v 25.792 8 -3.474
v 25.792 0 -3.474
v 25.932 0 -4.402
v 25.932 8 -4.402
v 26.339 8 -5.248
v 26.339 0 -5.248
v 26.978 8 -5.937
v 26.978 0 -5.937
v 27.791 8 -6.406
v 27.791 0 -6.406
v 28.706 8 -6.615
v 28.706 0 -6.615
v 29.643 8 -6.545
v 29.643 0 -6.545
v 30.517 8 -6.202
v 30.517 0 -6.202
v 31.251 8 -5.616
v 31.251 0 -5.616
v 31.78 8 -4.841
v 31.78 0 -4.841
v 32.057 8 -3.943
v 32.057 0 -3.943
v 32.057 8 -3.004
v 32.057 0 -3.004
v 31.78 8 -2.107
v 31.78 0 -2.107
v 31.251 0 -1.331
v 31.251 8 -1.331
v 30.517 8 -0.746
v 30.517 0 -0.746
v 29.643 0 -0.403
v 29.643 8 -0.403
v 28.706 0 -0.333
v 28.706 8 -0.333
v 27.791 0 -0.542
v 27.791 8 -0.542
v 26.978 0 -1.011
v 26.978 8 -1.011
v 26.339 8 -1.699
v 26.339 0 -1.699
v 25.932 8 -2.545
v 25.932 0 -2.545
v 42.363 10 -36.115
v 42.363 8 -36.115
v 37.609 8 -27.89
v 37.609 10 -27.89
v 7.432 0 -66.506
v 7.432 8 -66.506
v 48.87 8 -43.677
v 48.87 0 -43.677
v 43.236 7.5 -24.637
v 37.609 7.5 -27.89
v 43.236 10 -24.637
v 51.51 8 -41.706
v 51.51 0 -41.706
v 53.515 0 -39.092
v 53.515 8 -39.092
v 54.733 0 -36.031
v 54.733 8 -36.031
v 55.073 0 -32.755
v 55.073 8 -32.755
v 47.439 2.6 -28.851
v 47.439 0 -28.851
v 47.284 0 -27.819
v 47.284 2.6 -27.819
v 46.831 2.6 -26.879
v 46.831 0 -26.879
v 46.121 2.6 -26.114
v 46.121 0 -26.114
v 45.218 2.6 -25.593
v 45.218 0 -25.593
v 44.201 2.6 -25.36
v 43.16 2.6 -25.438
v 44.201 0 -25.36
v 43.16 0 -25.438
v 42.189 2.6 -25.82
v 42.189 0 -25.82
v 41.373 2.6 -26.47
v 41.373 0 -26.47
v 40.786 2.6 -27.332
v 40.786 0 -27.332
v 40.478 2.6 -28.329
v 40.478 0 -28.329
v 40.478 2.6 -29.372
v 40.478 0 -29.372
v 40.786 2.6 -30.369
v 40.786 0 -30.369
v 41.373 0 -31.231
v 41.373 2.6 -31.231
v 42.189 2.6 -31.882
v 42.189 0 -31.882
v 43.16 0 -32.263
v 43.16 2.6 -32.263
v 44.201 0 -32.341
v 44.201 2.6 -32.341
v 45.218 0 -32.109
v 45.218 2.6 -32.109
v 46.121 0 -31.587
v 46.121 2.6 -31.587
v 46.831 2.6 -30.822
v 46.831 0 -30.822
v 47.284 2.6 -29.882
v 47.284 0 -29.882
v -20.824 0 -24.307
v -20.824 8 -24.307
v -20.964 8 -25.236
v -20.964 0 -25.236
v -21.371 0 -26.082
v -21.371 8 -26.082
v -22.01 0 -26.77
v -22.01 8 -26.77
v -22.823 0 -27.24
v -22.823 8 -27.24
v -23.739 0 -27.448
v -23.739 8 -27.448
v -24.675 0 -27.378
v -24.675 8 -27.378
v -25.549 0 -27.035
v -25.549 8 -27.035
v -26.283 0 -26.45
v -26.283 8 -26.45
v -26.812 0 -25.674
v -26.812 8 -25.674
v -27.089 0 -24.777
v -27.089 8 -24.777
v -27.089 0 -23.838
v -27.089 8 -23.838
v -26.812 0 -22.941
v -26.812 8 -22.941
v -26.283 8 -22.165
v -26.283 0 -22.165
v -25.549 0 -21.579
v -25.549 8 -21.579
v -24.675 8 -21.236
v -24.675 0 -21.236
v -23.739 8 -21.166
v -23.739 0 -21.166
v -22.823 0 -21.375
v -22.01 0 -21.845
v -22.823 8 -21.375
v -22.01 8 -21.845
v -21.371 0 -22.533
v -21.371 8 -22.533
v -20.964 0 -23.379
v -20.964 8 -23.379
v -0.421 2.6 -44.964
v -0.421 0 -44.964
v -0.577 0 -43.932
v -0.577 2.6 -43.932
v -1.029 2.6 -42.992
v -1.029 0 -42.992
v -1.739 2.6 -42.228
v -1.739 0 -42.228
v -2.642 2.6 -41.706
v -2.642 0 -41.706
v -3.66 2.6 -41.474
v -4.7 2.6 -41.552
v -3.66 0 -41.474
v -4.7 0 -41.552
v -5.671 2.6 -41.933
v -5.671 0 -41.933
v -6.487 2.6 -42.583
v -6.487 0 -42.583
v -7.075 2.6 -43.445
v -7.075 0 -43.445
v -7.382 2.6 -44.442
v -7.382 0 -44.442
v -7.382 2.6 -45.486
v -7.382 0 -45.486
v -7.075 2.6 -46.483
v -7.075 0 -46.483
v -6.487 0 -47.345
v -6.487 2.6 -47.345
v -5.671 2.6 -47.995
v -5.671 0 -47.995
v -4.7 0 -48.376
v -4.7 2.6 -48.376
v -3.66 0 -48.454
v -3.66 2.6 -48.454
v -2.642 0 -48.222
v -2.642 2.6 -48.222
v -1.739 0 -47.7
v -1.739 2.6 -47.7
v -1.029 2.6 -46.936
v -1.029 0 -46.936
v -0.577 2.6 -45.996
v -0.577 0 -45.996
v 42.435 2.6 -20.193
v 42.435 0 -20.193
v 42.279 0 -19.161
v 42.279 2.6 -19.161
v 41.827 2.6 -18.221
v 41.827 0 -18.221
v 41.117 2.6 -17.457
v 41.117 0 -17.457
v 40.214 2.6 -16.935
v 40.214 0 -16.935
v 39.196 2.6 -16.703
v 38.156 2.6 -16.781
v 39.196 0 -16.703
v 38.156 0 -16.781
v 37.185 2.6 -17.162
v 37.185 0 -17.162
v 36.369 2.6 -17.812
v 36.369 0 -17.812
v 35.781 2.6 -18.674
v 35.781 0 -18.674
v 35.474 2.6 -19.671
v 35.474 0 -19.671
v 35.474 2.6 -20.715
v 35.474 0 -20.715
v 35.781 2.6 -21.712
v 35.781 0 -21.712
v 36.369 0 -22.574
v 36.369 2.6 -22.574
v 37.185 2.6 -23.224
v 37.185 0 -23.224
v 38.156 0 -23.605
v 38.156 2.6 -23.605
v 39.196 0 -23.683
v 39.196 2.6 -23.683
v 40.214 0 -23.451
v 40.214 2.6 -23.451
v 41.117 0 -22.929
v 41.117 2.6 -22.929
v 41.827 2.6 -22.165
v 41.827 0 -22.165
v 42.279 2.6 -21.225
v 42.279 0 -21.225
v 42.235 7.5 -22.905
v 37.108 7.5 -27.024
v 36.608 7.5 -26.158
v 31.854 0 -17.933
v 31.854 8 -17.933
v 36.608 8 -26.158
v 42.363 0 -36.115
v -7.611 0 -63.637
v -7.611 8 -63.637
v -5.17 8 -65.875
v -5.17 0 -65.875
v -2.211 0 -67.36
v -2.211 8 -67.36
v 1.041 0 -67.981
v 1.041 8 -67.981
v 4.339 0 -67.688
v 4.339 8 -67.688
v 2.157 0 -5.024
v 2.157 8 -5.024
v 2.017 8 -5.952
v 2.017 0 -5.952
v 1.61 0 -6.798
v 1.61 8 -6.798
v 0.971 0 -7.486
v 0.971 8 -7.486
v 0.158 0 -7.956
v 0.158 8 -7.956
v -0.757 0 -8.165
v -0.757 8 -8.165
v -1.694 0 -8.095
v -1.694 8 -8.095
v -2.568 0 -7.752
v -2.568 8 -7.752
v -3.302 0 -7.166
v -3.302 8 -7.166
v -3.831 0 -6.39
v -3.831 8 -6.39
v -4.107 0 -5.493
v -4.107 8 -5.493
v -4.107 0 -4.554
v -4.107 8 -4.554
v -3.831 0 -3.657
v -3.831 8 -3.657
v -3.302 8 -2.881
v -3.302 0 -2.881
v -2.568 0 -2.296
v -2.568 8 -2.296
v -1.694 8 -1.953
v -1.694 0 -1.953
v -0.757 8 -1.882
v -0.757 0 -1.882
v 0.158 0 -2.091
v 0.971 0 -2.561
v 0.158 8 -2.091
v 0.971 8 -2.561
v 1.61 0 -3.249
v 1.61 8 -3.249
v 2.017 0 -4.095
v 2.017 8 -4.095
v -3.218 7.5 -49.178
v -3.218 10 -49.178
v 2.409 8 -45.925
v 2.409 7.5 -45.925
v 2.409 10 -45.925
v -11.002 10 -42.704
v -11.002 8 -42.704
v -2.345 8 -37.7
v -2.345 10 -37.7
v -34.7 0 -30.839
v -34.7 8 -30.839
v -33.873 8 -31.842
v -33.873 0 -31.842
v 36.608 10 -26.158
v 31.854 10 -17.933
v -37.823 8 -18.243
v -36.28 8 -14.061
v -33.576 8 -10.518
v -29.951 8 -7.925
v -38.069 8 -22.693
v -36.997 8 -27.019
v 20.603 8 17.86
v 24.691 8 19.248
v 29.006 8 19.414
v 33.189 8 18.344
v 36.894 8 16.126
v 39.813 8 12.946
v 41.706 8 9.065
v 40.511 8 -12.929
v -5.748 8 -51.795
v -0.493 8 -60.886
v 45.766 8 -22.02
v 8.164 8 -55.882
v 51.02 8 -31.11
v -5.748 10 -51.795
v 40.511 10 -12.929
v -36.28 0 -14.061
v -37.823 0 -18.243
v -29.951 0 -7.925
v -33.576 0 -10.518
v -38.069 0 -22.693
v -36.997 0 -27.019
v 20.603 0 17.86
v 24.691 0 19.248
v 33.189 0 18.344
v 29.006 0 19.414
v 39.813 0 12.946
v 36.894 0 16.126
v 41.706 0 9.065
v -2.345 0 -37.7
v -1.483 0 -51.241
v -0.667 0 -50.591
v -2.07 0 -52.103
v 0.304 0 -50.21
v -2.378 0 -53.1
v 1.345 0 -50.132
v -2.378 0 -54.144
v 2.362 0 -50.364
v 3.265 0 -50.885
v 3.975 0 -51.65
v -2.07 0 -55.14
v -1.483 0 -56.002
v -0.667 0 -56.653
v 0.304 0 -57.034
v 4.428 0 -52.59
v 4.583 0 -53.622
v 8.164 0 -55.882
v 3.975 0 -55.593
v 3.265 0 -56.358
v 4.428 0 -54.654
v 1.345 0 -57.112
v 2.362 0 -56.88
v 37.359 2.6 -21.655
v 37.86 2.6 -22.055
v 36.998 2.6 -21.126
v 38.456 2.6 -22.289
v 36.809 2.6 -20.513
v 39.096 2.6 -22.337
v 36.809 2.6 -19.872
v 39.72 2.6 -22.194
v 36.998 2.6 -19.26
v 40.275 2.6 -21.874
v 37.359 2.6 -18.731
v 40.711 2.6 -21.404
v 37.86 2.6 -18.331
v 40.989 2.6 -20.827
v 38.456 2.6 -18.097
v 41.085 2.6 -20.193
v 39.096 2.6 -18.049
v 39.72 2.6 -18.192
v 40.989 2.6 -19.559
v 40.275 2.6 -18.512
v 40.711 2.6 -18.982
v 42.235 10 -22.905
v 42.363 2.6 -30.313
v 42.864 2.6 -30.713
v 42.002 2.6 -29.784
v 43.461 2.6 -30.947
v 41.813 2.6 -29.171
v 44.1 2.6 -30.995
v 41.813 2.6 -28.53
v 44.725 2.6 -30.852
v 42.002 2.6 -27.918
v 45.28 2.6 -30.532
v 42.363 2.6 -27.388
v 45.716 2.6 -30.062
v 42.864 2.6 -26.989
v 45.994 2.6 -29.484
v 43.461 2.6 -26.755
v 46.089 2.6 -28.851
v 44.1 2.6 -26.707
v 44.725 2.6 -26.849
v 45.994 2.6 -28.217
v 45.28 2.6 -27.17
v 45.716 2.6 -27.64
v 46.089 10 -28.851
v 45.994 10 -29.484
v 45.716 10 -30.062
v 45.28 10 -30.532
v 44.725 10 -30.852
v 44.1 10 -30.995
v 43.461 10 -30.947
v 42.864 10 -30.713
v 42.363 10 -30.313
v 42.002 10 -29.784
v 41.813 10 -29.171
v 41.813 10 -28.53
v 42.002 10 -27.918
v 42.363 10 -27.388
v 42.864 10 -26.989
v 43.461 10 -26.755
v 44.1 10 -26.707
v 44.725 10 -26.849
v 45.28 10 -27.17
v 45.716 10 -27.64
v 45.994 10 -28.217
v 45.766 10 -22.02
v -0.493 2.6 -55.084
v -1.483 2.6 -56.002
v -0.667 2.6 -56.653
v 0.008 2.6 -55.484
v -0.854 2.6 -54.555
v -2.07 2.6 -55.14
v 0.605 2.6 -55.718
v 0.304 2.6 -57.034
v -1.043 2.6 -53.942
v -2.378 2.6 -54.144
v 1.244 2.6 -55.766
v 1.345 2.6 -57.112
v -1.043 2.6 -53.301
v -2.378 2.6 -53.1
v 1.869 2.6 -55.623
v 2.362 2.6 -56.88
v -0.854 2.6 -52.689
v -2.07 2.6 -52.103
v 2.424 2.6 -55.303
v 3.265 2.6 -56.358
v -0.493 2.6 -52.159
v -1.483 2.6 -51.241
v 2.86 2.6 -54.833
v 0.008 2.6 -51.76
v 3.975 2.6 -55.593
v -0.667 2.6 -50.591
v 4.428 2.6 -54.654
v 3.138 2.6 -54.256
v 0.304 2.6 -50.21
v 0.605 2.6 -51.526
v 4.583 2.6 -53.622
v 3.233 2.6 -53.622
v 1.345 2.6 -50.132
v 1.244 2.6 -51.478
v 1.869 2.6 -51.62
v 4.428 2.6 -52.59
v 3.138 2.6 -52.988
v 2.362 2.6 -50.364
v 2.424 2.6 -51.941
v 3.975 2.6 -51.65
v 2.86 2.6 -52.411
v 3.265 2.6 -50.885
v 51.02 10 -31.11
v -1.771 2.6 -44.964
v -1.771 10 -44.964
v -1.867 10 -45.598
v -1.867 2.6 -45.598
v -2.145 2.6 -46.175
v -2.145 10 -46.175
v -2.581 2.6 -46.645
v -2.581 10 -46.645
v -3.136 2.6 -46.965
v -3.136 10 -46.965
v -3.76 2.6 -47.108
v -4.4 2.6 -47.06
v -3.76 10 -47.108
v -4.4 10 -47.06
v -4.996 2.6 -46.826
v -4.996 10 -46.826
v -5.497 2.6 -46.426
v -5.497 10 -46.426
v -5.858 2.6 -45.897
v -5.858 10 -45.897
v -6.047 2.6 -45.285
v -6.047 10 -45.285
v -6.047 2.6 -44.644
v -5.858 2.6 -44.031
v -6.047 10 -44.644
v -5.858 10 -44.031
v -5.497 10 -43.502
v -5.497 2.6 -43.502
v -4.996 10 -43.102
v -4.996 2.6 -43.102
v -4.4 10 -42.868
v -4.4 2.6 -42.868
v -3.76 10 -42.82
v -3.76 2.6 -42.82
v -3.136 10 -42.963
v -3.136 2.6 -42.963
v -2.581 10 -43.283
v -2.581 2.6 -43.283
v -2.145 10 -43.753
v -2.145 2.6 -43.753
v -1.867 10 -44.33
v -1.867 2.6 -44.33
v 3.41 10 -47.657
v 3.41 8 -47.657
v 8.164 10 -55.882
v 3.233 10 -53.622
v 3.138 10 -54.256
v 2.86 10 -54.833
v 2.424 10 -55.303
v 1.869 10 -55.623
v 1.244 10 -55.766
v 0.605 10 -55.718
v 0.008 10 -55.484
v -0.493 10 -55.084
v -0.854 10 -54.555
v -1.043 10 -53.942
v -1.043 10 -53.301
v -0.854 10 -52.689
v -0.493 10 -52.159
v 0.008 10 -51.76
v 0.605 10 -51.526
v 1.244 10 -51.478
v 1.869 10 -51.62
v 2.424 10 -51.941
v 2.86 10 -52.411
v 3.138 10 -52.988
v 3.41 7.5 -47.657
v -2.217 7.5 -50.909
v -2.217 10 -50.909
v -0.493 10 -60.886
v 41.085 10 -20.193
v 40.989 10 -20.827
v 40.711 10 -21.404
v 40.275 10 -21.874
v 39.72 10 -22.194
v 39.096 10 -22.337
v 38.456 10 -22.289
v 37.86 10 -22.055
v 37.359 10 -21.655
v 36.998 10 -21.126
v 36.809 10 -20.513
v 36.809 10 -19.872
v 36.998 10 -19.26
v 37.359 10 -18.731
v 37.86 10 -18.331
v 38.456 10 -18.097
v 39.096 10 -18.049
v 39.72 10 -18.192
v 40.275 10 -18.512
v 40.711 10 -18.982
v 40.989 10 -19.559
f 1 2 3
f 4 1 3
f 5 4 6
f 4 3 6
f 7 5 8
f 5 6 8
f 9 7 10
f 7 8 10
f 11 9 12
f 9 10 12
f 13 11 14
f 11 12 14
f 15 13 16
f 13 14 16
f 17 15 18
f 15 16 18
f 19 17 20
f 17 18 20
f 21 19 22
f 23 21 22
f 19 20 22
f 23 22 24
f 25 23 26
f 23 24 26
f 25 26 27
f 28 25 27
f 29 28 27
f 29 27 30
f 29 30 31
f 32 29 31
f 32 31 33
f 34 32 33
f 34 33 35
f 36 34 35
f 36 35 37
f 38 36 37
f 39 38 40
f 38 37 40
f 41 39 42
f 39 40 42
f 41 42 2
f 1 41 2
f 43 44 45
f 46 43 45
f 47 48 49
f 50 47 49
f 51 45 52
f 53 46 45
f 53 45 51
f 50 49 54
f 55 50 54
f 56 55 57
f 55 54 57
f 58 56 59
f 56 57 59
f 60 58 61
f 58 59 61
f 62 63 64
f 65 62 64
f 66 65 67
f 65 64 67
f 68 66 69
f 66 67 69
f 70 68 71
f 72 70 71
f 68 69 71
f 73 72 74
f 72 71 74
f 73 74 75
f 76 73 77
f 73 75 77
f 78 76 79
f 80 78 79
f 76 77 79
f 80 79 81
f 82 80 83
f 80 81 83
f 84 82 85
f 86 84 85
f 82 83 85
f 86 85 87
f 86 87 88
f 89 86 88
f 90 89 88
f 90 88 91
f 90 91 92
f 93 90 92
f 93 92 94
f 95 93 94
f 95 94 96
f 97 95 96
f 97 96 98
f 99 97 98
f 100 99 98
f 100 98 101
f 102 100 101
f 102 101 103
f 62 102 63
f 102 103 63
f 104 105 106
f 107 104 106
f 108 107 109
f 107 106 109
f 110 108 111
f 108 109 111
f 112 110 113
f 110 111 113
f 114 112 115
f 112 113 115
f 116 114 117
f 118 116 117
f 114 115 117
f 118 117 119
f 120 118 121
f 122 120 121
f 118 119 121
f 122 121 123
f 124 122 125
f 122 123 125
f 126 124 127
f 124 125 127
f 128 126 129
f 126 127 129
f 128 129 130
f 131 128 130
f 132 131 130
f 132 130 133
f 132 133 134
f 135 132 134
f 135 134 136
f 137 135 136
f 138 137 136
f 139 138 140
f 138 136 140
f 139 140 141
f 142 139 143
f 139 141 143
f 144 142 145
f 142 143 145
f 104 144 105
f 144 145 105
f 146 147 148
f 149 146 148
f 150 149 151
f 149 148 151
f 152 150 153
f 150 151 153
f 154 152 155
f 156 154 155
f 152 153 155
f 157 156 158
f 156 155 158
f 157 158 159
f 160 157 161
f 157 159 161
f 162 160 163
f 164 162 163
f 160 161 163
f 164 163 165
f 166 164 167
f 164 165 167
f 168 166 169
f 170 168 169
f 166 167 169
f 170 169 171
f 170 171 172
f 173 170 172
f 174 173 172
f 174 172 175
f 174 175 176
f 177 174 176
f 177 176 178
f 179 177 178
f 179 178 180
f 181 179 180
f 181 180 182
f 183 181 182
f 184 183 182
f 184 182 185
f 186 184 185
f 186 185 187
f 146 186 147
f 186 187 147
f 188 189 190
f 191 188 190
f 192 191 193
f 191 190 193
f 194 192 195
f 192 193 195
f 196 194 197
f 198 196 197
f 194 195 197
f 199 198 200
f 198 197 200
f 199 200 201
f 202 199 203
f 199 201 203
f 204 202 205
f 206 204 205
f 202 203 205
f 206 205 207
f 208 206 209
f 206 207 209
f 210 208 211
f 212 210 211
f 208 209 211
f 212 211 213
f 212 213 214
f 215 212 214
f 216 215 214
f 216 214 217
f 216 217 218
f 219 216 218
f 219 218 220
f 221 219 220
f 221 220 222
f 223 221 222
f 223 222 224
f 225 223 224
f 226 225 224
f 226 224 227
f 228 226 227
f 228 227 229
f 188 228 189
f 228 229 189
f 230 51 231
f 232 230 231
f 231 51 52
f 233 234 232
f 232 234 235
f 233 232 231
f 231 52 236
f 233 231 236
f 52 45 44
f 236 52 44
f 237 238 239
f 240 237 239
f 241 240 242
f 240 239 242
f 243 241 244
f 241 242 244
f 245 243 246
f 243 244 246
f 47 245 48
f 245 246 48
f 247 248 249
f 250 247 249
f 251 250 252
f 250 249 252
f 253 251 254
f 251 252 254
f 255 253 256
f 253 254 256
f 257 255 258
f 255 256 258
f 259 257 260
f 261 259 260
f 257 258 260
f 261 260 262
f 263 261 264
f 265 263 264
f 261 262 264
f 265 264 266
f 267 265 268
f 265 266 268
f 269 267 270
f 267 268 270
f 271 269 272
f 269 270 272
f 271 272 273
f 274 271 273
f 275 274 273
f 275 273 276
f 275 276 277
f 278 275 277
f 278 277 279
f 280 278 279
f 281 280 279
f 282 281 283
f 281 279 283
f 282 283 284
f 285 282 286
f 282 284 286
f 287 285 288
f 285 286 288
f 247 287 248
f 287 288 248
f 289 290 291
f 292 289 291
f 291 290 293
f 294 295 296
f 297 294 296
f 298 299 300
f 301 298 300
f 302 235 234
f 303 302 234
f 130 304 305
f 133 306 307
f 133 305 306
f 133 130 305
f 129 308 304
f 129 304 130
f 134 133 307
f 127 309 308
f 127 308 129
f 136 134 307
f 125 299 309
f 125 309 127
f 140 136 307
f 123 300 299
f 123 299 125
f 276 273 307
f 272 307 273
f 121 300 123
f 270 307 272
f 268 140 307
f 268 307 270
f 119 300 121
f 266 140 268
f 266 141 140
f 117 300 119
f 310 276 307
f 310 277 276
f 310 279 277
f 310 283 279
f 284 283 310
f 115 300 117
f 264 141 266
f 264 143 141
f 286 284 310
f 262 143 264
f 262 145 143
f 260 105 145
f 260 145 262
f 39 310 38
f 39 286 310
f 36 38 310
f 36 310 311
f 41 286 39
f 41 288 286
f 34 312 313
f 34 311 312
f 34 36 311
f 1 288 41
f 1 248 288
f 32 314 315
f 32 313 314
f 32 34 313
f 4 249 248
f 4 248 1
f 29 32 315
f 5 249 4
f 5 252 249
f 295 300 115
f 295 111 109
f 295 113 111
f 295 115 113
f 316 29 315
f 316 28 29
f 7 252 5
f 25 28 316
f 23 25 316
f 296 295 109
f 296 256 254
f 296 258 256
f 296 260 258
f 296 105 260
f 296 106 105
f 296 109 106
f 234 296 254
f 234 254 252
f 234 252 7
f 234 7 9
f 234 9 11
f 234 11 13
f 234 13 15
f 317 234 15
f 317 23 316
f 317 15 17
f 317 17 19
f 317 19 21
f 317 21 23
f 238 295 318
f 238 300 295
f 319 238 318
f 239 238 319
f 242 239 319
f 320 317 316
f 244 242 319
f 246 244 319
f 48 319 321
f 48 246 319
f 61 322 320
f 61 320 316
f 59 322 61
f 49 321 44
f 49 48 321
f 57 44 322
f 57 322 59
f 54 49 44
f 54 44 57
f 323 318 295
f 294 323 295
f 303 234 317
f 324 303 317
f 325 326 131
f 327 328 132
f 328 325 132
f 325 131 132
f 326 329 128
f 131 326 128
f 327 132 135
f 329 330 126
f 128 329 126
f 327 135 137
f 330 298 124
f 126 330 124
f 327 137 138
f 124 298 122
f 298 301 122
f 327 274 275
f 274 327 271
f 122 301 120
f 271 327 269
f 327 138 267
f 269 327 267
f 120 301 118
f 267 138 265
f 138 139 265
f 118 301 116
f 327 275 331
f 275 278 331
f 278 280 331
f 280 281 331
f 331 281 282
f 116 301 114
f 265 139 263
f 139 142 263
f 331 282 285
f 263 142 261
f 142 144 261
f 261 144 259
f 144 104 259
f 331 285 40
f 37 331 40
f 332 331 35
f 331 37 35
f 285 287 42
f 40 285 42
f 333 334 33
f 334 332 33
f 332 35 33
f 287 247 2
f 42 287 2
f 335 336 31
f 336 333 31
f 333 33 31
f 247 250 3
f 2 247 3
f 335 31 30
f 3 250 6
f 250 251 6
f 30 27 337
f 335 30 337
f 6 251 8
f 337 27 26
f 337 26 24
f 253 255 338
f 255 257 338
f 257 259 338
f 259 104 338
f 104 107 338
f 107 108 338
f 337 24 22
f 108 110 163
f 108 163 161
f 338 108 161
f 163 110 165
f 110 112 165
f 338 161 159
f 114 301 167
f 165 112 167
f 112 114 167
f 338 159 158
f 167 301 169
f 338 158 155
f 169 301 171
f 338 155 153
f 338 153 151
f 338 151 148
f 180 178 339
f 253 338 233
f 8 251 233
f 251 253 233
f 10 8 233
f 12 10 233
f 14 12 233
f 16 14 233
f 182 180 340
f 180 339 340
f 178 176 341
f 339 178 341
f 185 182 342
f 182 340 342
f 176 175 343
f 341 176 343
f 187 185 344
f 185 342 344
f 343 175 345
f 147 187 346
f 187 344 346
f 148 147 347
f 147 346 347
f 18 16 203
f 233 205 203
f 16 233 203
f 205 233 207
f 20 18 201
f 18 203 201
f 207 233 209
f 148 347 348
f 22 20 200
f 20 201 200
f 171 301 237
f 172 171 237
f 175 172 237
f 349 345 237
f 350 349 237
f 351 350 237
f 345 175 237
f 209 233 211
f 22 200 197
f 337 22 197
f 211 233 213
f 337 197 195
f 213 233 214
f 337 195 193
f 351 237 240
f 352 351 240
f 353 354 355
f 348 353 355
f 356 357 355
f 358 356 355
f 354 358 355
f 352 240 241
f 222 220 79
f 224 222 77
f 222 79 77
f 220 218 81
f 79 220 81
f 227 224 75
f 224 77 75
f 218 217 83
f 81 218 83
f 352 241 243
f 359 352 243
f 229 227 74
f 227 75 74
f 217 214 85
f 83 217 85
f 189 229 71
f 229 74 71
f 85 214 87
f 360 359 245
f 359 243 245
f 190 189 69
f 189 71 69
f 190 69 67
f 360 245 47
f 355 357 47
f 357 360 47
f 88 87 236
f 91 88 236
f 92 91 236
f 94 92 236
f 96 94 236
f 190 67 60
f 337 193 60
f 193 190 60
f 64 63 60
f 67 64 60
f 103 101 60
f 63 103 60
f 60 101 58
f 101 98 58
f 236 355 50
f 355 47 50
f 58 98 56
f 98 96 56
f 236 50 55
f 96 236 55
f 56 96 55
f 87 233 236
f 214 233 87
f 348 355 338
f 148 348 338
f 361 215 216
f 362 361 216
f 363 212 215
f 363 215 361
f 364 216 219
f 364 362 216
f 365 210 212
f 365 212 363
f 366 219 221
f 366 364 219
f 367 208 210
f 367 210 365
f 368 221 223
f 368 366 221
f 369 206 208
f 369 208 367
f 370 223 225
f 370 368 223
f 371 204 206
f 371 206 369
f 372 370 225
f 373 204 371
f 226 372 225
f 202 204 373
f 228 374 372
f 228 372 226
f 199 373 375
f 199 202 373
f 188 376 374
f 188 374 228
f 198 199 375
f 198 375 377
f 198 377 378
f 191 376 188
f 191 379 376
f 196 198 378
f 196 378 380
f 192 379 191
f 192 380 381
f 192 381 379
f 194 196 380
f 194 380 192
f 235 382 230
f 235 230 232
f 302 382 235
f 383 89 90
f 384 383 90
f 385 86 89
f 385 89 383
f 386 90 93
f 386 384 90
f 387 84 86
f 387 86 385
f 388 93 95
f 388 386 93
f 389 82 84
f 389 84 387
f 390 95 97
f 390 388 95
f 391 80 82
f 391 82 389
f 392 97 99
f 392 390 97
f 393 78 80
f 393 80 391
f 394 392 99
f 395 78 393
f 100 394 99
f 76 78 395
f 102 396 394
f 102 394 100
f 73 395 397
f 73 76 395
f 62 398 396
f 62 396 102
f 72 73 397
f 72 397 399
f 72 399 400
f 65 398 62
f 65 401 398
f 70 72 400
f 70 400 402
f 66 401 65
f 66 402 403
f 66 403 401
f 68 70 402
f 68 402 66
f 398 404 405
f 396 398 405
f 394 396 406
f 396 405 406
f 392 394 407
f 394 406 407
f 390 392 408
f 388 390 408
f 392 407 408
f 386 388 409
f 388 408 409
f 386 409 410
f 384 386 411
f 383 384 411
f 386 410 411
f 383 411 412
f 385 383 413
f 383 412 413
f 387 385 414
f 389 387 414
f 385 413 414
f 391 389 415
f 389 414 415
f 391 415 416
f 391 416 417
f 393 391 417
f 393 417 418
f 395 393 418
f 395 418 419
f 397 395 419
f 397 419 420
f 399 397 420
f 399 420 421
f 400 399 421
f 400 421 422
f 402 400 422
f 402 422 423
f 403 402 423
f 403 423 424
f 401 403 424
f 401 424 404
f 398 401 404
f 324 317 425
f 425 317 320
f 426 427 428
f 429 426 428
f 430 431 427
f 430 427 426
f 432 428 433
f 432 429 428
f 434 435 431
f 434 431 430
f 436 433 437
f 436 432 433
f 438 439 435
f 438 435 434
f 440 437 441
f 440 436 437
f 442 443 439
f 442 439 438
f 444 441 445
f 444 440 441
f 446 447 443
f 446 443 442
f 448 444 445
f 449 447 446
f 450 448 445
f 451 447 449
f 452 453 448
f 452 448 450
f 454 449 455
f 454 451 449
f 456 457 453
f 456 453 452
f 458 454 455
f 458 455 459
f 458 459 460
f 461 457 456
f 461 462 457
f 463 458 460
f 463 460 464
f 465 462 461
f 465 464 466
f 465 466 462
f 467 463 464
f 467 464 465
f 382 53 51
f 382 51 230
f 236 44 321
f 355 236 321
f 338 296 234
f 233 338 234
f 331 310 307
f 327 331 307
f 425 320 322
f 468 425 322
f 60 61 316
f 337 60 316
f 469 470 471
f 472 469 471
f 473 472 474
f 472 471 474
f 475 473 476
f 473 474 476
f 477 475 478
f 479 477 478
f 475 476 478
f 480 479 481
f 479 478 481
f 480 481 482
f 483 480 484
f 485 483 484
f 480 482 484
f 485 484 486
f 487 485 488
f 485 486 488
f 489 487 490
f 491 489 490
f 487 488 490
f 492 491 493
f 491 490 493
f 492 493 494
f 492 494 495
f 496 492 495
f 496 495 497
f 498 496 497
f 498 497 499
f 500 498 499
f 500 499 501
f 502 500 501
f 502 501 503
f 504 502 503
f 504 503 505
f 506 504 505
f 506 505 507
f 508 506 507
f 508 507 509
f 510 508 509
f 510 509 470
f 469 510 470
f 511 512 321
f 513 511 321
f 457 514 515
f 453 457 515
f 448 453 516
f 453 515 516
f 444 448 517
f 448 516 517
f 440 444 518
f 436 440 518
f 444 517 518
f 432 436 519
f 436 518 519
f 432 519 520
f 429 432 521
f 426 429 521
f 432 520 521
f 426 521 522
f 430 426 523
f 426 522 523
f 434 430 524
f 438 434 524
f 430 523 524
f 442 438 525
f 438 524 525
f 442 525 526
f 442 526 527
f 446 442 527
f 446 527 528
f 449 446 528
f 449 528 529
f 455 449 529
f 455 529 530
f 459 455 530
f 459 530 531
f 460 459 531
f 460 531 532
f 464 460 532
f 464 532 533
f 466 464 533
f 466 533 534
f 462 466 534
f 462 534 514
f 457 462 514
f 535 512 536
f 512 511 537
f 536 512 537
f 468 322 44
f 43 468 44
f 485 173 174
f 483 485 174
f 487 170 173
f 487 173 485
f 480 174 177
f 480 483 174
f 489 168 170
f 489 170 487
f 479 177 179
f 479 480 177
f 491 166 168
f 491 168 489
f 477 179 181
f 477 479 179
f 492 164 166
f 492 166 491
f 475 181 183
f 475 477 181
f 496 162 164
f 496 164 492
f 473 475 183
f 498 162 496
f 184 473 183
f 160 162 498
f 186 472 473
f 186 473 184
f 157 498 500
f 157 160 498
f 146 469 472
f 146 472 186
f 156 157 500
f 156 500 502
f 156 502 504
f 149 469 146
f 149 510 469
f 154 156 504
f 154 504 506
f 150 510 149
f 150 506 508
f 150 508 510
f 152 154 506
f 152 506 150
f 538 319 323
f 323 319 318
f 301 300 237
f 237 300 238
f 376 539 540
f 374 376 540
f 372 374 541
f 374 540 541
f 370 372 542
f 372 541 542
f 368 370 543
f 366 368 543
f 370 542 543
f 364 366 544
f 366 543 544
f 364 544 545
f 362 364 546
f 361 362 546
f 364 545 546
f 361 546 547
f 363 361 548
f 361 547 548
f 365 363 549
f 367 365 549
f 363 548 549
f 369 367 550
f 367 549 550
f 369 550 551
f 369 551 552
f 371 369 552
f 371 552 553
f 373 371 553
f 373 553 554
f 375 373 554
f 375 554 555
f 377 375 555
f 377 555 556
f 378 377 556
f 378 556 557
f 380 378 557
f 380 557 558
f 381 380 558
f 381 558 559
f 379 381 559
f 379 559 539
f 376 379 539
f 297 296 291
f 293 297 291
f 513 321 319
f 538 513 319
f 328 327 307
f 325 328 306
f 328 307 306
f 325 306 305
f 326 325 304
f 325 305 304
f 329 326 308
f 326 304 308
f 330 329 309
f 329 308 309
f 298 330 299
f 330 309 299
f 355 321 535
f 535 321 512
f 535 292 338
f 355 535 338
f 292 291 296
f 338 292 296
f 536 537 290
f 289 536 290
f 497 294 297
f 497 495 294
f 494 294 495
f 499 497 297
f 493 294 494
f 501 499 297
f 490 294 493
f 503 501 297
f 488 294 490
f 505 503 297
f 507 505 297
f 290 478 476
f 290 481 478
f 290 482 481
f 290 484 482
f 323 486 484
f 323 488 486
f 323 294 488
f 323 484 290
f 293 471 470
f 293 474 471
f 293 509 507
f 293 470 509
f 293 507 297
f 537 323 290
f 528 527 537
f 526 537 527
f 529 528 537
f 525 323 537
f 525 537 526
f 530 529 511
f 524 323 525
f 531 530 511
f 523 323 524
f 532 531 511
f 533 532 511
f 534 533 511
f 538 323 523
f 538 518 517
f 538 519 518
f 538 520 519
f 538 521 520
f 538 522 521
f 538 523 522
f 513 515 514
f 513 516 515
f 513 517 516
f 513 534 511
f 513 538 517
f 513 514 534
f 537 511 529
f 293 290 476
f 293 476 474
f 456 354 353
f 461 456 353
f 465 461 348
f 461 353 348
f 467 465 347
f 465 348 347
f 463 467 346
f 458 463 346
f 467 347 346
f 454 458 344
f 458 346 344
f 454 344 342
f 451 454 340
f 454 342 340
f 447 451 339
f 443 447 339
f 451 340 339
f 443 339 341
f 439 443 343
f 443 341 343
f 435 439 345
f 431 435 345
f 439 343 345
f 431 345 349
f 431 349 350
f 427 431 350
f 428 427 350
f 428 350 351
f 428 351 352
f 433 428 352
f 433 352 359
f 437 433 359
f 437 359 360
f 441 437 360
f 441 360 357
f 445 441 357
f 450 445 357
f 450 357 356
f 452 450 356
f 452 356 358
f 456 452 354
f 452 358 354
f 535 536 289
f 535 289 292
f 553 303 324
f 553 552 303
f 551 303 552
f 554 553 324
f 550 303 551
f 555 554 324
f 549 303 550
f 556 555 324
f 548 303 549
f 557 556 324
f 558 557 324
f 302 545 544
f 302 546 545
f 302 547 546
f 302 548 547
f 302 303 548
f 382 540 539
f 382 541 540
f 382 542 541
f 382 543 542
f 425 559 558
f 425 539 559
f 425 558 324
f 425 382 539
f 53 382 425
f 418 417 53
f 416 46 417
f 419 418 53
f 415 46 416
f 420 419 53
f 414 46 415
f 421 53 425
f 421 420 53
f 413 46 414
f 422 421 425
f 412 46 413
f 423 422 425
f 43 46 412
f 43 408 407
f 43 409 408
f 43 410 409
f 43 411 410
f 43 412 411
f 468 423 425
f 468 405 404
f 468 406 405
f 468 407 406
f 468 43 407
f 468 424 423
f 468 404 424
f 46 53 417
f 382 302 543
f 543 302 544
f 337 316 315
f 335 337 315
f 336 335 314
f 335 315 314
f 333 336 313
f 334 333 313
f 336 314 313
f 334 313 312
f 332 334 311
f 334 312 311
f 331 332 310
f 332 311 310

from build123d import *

# Parameters (mm, degrees)
BOSS_EXTRUDE2_DEPTH = 8
SKETCH2_R           = 3.15
CUT_EXTRUDE1_DEPTH  = 8
BOSS_EXTRUDE4_DEPTH = 2
CUT_EXTRUDE2_DEPTH  = 14
SKETCH5_R           = 2.15
CUT_EXTRUDE3_DEPTH  = 14
SKETCH6_R           = 3.5
CUT_EXTRUDE4_DEPTH  = 2.6
CUT_EXTRUDE5_DEPTH  = 18.5
BOSS_EXTRUDE7_DEPTH = 8
SKETCH9_R           = 3.15
CUT_EXTRUDE6_DEPTH  = 8
CUT_EXTRUDE8_DEPTH  = 8
BOSS_EXTRUDE8_DEPTH = 8
CUT_EXTRUDE9_DEPTH  = 2.5


with BuildPart() as part:
    # Sketch1 → Boss-Extrude2 (new body)
    with BuildSketch(Plane(origin=(0, 0, 0), x_dir=(1, 0, 0), z_dir=(0, 1, 0))):
        Polygon((-36.064195387, 30.19821093), (-36.064195387, 45.055140387), (-24.456215945, 60.508200645), (25.928290152, 75.028423128), (63.192701615, 49.978777876), (57.8600206, 4.654046233), (5.024212079, -12.575443702), (-26.79369062, -0.934399252), align=None)
    extrude(amount=BOSS_EXTRUDE2_DEPTH)

    # Sketch2 → Cut-Extrude1 (cut)
    with BuildSketch(Plane(origin=(0, 8, 0), x_dir=(1, 0, 0), z_dir=(0, 1, 0))):
        with Locations((-0.992606529, 5.023658057)):
            Circle(SKETCH2_R)
        with Locations((-23.973939823, 24.307286348)):
            Circle(SKETCH2_R)
    extrude(amount=-CUT_EXTRUDE1_DEPTH, mode=Mode.SUBTRACT)

    # Sketch3 → Boss-Extrude4 (add)
    with BuildSketch(Plane(origin=(0, 8, 0), x_dir=(1, 0, 0), z_dir=(0, 1, 0))):
        Polygon((-5.747908307, 51.79510143), (2.909877598, 46.790828933), (8.164363719, 55.881504134), (-0.493422186, 60.885776631), align=None)
        Polygon((-2.344608524, 37.700153733), (2.909877598, 46.790828933), (-5.747908307, 51.79510143), (-11.002394429, 42.70442623), align=None)
        Polygon((37.108131922, 27.023952571), (45.765917827, 22.019680074), (51.020403949, 31.110355274), (42.362618044, 36.114627771), align=None)
        Polygon((40.511431705, 12.929004873), (45.765917827, 22.019680074), (37.108131922, 27.023952571), (31.8536458, 17.93327737), align=None)
    extrude(amount=BOSS_EXTRUDE4_DEPTH)

    # Sketch4 → Cut-Extrude2 (cut)
    with BuildSketch(Plane(origin=(0, 8, 0), x_dir=(1, 0, 0), z_dir=(0, 1, 0))):
        Polygon((8.164363719, 55.881504134), (-2.344608524, 37.700153733), (31.8536458, 17.93327737), (42.362618044, 36.114627771), align=None)
    extrude(amount=-CUT_EXTRUDE2_DEPTH, mode=Mode.SUBTRACT)

    # Sketch5 → Cut-Extrude3 (cut)
    with BuildSketch(Plane(origin=(0, 10, 0), x_dir=(1, 0, 0), z_dir=(0, 1, 0))):
        with Locations((-3.921151603, 44.964072229)):
            Circle(SKETCH5_R)
        with Locations((1.083120894, 53.621858134)):
            Circle(SKETCH5_R)
        with Locations((43.939161123, 28.850709275)):
            Circle(SKETCH5_R)
        with Locations((38.934888626, 20.19292337)):
            Circle(SKETCH5_R)
    extrude(amount=-CUT_EXTRUDE3_DEPTH, mode=Mode.SUBTRACT)

    # Sketch6 → Cut-Extrude4 (cut)
    with BuildSketch(Plane.XZ):
        with Locations((43.939161123, -28.850709275)):
            Circle(SKETCH6_R)
        with Locations((38.934888626, -20.19292337)):
            Circle(SKETCH6_R)
        with Locations((1.083120894, -53.621858134)):
            Circle(SKETCH6_R)
        with Locations((-3.921151603, -44.964072229)):
            Circle(SKETCH6_R)
    extrude(amount=-CUT_EXTRUDE4_DEPTH, mode=Mode.SUBTRACT)

    # Sketch7 → Cut-Extrude5 (cut)
    with BuildSketch(Plane(origin=(0, 8, 0), x_dir=(1, 0, 0), z_dir=(0, 1, 0))):
        Polygon((-23.90080129, 101.032848336), (-57.901406204, 20.736967462), (-18.158957139, -32.533824917), (87.924213713, -9.961236853), (85.311975199, 49.315634488), align=None)
        Polygon((-40.820623888, 23.42964982), (-5.371906334, -12.019067733), (42.940552226, -17.400063196), (73.057764711, 41.083606285), (-8.197554073, 82.927487203), align=None, mode=Mode.SUBTRACT)
    extrude(amount=-CUT_EXTRUDE5_DEPTH, mode=Mode.SUBTRACT)

    # Sketch8 → Boss-Extrude7 (add)
    with BuildSketch(Plane(origin=(0, 8, 0), x_dir=(1, 0, 0), z_dir=(0, 1, 0))):
        Polygon((-8.197554073, 82.927487203), (-40.820623888, 23.42964982), (-5.371906334, -12.019067733), (42.940552226, -17.400063196), (73.057764711, 41.083606285), align=None)
        Polygon((7.41963674, 62.005546744), (-9.746922841, 64.747246038), (-32.401642497, 23.42964982), (0, -4.674812176), (46.197479834, 11.841771544), (56.025503799, 35.943618774), align=None, mode=Mode.SUBTRACT)
    extrude(amount=-BOSS_EXTRUDE7_DEPTH)

    # Sketch9 → Cut-Extrude6 (cut)
    with BuildSketch(Plane(origin=(0, 0, 0), x_dir=(-1, 0, 0), z_dir=(0, -1, 0))):
        with Locations((-28.941808693, 3.473889793)):
            Circle(SKETCH9_R)
    extrude(amount=-CUT_EXTRUDE6_DEPTH, mode=Mode.SUBTRACT)

    # Sketch10 → Cut-Extrude8 (cut)
    with BuildSketch(Plane(origin=(0, 8, 0), x_dir=(1, 0, 0), z_dir=(0, 1, 0))):
        Polygon((-51.027907223, 26.499697203), (-18.337970987, 89.979258173), (70.618900133, 64.73001084), (85.862243499, 8.329361683), (41.198193823, -31.646717715), (-23.676019088, -9.814381331), align=None)
        with BuildLine():
            Line((-33.872566493, 31.841833363), (-7.610913822, 63.637460521))
            ThreePointArc((-7.610913822, 63.637460521), (-0.606725689, 67.783190008), (7.431616747, 66.506171896))
            Line((7.431616747, 66.506171896), (48.870452229, 43.677060264))
            ThreePointArc((48.870452229, 43.677060264), (53.514897305, 39.092266426), (55.073012074, 32.754799821))
            Line((55.073012074, 32.754799821), (41.706263242, -9.064889609))
            ThreePointArc((41.706263242, -9.064889609), (33.18888877, -18.343686498), (20.602861854, -17.860296318))
            Line((20.602861854, -17.860296318), (-29.950777497, 7.924950794))
            ThreePointArc((-29.950777497, 7.924950794), (-37.823070784, 18.242703419), (-34.700474084, 30.839465332))
            Line((-34.700474084, 30.839465332), (-33.872566493, 31.841833363))
        make_face(mode=Mode.SUBTRACT)
    extrude(amount=-CUT_EXTRUDE8_DEPTH, mode=Mode.SUBTRACT)

    # Sketch12 → Boss-Extrude8 (add)
    with BuildSketch(Plane(origin=(0, 8, 0), x_dir=(1, 0, 0), z_dir=(0, 1, 0))):
        with BuildLine():
            Line((-34.700474084, 30.839465332), (-23.799416497, 10.878604368))
            Line((-23.799416497, 10.878604368), (16.273254251, -10.775107124))
            Line((16.273254251, -10.775107124), (41.706263242, -9.064889609))
            ThreePointArc((41.706263242, -9.064889609), (33.18888877, -18.343686498), (20.602861854, -17.860296318))
            Line((20.602861854, -17.860296318), (-29.950777497, 7.924950794))
            ThreePointArc((-29.950777497, 7.924950794), (-37.823070784, 18.242703419), (-34.700474084, 30.839465332))
        make_face()
    extrude(amount=-BOSS_EXTRUDE8_DEPTH)

    # Sketch13 → Cut-Extrude9 (cut)
    with BuildSketch(Plane(origin=(0, 10, 0), x_dir=(1, 0, 0), z_dir=(0, 1, 0))):
        Polygon((37.108131922, 27.023952571), (37.608559172, 27.889731161), (43.23612001, 24.636954038), (42.235265511, 22.905396857), (36.607704672, 26.15817398), align=None)
        Polygon((3.410304847, 47.656607524), (-2.217255991, 50.909384647), (-3.21811049, 49.177827466), (2.409450348, 45.925050343), align=None)
    extrude(amount=-CUT_EXTRUDE9_DEPTH, mode=Mode.SUBTRACT)


solid = part.part
